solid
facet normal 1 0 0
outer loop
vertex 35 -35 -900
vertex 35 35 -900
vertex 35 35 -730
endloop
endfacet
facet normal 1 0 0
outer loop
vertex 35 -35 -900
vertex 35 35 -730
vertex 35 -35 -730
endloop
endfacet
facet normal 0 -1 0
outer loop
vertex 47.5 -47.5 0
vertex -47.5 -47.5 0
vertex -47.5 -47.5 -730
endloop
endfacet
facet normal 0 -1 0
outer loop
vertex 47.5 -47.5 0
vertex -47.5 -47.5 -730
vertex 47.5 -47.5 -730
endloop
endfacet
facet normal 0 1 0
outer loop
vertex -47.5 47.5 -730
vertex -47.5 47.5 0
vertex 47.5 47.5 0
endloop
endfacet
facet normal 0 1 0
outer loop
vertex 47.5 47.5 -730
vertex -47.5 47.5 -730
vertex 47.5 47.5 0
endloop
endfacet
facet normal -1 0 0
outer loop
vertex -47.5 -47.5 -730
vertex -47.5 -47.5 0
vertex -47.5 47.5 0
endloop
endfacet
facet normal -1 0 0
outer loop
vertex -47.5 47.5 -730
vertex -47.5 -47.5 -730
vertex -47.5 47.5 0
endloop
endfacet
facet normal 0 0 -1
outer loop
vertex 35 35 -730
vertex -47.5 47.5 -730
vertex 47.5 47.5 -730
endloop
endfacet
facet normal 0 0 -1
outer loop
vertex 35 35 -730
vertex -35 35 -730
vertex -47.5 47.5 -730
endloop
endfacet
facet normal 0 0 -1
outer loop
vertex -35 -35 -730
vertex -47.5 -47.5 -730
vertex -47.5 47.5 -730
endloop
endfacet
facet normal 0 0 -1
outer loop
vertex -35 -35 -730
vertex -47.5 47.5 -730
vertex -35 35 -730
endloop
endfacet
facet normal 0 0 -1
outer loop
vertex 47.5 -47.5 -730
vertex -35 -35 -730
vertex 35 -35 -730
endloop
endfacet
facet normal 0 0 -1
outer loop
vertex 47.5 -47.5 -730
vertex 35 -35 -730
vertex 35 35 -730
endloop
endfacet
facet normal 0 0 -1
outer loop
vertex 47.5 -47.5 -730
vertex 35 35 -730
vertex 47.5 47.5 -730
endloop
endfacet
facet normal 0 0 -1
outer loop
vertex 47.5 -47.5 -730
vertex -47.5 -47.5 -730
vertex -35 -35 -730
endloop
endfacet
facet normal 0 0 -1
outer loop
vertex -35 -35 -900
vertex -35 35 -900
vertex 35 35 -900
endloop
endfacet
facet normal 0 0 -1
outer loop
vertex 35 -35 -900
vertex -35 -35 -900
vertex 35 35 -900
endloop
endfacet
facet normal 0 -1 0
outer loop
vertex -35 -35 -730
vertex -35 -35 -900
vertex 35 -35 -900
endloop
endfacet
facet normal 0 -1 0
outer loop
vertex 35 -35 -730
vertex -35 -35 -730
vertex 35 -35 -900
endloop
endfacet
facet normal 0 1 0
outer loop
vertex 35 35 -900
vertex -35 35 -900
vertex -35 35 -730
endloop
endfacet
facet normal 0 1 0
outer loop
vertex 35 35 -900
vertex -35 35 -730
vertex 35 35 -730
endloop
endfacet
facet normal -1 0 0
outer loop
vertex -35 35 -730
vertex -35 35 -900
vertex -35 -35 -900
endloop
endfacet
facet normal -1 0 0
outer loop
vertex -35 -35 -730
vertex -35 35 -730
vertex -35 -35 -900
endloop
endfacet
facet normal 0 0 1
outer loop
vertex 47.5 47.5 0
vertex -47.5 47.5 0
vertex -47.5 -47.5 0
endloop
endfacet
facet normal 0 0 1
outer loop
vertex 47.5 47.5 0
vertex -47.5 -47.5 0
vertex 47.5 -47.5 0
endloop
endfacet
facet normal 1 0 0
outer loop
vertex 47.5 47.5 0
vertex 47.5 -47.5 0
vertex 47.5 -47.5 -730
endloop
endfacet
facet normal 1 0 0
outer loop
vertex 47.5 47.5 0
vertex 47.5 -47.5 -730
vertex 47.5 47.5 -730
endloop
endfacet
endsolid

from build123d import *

# Parameters (mm, degrees)
F0_W     = 95
F0_H     = 95
F1_DEPTH = 900
F2_W     = 95
F2_H     = 95
F2_W_2   = 70
F2_H_2   = 70
F3_DEPTH = 170


with BuildPart() as f1:
    # F0 (on Top) → F1 (new body)
    with BuildSketch(Plane.XY):
        Rectangle(F0_W, F0_H)
    extrude(amount=-F1_DEPTH)

    # F2 (on face) → F3 (cut)
    with BuildSketch(Plane(origin=(0, 0, -900), x_dir=(1, 0, 0), z_dir=(0, 0, -1))):
        Rectangle(F2_W, F2_H)
        Rectangle(F2_W_2, F2_H_2, mode=Mode.SUBTRACT)
    extrude(amount=-F3_DEPTH, mode=Mode.SUBTRACT)


solid = f1.part
